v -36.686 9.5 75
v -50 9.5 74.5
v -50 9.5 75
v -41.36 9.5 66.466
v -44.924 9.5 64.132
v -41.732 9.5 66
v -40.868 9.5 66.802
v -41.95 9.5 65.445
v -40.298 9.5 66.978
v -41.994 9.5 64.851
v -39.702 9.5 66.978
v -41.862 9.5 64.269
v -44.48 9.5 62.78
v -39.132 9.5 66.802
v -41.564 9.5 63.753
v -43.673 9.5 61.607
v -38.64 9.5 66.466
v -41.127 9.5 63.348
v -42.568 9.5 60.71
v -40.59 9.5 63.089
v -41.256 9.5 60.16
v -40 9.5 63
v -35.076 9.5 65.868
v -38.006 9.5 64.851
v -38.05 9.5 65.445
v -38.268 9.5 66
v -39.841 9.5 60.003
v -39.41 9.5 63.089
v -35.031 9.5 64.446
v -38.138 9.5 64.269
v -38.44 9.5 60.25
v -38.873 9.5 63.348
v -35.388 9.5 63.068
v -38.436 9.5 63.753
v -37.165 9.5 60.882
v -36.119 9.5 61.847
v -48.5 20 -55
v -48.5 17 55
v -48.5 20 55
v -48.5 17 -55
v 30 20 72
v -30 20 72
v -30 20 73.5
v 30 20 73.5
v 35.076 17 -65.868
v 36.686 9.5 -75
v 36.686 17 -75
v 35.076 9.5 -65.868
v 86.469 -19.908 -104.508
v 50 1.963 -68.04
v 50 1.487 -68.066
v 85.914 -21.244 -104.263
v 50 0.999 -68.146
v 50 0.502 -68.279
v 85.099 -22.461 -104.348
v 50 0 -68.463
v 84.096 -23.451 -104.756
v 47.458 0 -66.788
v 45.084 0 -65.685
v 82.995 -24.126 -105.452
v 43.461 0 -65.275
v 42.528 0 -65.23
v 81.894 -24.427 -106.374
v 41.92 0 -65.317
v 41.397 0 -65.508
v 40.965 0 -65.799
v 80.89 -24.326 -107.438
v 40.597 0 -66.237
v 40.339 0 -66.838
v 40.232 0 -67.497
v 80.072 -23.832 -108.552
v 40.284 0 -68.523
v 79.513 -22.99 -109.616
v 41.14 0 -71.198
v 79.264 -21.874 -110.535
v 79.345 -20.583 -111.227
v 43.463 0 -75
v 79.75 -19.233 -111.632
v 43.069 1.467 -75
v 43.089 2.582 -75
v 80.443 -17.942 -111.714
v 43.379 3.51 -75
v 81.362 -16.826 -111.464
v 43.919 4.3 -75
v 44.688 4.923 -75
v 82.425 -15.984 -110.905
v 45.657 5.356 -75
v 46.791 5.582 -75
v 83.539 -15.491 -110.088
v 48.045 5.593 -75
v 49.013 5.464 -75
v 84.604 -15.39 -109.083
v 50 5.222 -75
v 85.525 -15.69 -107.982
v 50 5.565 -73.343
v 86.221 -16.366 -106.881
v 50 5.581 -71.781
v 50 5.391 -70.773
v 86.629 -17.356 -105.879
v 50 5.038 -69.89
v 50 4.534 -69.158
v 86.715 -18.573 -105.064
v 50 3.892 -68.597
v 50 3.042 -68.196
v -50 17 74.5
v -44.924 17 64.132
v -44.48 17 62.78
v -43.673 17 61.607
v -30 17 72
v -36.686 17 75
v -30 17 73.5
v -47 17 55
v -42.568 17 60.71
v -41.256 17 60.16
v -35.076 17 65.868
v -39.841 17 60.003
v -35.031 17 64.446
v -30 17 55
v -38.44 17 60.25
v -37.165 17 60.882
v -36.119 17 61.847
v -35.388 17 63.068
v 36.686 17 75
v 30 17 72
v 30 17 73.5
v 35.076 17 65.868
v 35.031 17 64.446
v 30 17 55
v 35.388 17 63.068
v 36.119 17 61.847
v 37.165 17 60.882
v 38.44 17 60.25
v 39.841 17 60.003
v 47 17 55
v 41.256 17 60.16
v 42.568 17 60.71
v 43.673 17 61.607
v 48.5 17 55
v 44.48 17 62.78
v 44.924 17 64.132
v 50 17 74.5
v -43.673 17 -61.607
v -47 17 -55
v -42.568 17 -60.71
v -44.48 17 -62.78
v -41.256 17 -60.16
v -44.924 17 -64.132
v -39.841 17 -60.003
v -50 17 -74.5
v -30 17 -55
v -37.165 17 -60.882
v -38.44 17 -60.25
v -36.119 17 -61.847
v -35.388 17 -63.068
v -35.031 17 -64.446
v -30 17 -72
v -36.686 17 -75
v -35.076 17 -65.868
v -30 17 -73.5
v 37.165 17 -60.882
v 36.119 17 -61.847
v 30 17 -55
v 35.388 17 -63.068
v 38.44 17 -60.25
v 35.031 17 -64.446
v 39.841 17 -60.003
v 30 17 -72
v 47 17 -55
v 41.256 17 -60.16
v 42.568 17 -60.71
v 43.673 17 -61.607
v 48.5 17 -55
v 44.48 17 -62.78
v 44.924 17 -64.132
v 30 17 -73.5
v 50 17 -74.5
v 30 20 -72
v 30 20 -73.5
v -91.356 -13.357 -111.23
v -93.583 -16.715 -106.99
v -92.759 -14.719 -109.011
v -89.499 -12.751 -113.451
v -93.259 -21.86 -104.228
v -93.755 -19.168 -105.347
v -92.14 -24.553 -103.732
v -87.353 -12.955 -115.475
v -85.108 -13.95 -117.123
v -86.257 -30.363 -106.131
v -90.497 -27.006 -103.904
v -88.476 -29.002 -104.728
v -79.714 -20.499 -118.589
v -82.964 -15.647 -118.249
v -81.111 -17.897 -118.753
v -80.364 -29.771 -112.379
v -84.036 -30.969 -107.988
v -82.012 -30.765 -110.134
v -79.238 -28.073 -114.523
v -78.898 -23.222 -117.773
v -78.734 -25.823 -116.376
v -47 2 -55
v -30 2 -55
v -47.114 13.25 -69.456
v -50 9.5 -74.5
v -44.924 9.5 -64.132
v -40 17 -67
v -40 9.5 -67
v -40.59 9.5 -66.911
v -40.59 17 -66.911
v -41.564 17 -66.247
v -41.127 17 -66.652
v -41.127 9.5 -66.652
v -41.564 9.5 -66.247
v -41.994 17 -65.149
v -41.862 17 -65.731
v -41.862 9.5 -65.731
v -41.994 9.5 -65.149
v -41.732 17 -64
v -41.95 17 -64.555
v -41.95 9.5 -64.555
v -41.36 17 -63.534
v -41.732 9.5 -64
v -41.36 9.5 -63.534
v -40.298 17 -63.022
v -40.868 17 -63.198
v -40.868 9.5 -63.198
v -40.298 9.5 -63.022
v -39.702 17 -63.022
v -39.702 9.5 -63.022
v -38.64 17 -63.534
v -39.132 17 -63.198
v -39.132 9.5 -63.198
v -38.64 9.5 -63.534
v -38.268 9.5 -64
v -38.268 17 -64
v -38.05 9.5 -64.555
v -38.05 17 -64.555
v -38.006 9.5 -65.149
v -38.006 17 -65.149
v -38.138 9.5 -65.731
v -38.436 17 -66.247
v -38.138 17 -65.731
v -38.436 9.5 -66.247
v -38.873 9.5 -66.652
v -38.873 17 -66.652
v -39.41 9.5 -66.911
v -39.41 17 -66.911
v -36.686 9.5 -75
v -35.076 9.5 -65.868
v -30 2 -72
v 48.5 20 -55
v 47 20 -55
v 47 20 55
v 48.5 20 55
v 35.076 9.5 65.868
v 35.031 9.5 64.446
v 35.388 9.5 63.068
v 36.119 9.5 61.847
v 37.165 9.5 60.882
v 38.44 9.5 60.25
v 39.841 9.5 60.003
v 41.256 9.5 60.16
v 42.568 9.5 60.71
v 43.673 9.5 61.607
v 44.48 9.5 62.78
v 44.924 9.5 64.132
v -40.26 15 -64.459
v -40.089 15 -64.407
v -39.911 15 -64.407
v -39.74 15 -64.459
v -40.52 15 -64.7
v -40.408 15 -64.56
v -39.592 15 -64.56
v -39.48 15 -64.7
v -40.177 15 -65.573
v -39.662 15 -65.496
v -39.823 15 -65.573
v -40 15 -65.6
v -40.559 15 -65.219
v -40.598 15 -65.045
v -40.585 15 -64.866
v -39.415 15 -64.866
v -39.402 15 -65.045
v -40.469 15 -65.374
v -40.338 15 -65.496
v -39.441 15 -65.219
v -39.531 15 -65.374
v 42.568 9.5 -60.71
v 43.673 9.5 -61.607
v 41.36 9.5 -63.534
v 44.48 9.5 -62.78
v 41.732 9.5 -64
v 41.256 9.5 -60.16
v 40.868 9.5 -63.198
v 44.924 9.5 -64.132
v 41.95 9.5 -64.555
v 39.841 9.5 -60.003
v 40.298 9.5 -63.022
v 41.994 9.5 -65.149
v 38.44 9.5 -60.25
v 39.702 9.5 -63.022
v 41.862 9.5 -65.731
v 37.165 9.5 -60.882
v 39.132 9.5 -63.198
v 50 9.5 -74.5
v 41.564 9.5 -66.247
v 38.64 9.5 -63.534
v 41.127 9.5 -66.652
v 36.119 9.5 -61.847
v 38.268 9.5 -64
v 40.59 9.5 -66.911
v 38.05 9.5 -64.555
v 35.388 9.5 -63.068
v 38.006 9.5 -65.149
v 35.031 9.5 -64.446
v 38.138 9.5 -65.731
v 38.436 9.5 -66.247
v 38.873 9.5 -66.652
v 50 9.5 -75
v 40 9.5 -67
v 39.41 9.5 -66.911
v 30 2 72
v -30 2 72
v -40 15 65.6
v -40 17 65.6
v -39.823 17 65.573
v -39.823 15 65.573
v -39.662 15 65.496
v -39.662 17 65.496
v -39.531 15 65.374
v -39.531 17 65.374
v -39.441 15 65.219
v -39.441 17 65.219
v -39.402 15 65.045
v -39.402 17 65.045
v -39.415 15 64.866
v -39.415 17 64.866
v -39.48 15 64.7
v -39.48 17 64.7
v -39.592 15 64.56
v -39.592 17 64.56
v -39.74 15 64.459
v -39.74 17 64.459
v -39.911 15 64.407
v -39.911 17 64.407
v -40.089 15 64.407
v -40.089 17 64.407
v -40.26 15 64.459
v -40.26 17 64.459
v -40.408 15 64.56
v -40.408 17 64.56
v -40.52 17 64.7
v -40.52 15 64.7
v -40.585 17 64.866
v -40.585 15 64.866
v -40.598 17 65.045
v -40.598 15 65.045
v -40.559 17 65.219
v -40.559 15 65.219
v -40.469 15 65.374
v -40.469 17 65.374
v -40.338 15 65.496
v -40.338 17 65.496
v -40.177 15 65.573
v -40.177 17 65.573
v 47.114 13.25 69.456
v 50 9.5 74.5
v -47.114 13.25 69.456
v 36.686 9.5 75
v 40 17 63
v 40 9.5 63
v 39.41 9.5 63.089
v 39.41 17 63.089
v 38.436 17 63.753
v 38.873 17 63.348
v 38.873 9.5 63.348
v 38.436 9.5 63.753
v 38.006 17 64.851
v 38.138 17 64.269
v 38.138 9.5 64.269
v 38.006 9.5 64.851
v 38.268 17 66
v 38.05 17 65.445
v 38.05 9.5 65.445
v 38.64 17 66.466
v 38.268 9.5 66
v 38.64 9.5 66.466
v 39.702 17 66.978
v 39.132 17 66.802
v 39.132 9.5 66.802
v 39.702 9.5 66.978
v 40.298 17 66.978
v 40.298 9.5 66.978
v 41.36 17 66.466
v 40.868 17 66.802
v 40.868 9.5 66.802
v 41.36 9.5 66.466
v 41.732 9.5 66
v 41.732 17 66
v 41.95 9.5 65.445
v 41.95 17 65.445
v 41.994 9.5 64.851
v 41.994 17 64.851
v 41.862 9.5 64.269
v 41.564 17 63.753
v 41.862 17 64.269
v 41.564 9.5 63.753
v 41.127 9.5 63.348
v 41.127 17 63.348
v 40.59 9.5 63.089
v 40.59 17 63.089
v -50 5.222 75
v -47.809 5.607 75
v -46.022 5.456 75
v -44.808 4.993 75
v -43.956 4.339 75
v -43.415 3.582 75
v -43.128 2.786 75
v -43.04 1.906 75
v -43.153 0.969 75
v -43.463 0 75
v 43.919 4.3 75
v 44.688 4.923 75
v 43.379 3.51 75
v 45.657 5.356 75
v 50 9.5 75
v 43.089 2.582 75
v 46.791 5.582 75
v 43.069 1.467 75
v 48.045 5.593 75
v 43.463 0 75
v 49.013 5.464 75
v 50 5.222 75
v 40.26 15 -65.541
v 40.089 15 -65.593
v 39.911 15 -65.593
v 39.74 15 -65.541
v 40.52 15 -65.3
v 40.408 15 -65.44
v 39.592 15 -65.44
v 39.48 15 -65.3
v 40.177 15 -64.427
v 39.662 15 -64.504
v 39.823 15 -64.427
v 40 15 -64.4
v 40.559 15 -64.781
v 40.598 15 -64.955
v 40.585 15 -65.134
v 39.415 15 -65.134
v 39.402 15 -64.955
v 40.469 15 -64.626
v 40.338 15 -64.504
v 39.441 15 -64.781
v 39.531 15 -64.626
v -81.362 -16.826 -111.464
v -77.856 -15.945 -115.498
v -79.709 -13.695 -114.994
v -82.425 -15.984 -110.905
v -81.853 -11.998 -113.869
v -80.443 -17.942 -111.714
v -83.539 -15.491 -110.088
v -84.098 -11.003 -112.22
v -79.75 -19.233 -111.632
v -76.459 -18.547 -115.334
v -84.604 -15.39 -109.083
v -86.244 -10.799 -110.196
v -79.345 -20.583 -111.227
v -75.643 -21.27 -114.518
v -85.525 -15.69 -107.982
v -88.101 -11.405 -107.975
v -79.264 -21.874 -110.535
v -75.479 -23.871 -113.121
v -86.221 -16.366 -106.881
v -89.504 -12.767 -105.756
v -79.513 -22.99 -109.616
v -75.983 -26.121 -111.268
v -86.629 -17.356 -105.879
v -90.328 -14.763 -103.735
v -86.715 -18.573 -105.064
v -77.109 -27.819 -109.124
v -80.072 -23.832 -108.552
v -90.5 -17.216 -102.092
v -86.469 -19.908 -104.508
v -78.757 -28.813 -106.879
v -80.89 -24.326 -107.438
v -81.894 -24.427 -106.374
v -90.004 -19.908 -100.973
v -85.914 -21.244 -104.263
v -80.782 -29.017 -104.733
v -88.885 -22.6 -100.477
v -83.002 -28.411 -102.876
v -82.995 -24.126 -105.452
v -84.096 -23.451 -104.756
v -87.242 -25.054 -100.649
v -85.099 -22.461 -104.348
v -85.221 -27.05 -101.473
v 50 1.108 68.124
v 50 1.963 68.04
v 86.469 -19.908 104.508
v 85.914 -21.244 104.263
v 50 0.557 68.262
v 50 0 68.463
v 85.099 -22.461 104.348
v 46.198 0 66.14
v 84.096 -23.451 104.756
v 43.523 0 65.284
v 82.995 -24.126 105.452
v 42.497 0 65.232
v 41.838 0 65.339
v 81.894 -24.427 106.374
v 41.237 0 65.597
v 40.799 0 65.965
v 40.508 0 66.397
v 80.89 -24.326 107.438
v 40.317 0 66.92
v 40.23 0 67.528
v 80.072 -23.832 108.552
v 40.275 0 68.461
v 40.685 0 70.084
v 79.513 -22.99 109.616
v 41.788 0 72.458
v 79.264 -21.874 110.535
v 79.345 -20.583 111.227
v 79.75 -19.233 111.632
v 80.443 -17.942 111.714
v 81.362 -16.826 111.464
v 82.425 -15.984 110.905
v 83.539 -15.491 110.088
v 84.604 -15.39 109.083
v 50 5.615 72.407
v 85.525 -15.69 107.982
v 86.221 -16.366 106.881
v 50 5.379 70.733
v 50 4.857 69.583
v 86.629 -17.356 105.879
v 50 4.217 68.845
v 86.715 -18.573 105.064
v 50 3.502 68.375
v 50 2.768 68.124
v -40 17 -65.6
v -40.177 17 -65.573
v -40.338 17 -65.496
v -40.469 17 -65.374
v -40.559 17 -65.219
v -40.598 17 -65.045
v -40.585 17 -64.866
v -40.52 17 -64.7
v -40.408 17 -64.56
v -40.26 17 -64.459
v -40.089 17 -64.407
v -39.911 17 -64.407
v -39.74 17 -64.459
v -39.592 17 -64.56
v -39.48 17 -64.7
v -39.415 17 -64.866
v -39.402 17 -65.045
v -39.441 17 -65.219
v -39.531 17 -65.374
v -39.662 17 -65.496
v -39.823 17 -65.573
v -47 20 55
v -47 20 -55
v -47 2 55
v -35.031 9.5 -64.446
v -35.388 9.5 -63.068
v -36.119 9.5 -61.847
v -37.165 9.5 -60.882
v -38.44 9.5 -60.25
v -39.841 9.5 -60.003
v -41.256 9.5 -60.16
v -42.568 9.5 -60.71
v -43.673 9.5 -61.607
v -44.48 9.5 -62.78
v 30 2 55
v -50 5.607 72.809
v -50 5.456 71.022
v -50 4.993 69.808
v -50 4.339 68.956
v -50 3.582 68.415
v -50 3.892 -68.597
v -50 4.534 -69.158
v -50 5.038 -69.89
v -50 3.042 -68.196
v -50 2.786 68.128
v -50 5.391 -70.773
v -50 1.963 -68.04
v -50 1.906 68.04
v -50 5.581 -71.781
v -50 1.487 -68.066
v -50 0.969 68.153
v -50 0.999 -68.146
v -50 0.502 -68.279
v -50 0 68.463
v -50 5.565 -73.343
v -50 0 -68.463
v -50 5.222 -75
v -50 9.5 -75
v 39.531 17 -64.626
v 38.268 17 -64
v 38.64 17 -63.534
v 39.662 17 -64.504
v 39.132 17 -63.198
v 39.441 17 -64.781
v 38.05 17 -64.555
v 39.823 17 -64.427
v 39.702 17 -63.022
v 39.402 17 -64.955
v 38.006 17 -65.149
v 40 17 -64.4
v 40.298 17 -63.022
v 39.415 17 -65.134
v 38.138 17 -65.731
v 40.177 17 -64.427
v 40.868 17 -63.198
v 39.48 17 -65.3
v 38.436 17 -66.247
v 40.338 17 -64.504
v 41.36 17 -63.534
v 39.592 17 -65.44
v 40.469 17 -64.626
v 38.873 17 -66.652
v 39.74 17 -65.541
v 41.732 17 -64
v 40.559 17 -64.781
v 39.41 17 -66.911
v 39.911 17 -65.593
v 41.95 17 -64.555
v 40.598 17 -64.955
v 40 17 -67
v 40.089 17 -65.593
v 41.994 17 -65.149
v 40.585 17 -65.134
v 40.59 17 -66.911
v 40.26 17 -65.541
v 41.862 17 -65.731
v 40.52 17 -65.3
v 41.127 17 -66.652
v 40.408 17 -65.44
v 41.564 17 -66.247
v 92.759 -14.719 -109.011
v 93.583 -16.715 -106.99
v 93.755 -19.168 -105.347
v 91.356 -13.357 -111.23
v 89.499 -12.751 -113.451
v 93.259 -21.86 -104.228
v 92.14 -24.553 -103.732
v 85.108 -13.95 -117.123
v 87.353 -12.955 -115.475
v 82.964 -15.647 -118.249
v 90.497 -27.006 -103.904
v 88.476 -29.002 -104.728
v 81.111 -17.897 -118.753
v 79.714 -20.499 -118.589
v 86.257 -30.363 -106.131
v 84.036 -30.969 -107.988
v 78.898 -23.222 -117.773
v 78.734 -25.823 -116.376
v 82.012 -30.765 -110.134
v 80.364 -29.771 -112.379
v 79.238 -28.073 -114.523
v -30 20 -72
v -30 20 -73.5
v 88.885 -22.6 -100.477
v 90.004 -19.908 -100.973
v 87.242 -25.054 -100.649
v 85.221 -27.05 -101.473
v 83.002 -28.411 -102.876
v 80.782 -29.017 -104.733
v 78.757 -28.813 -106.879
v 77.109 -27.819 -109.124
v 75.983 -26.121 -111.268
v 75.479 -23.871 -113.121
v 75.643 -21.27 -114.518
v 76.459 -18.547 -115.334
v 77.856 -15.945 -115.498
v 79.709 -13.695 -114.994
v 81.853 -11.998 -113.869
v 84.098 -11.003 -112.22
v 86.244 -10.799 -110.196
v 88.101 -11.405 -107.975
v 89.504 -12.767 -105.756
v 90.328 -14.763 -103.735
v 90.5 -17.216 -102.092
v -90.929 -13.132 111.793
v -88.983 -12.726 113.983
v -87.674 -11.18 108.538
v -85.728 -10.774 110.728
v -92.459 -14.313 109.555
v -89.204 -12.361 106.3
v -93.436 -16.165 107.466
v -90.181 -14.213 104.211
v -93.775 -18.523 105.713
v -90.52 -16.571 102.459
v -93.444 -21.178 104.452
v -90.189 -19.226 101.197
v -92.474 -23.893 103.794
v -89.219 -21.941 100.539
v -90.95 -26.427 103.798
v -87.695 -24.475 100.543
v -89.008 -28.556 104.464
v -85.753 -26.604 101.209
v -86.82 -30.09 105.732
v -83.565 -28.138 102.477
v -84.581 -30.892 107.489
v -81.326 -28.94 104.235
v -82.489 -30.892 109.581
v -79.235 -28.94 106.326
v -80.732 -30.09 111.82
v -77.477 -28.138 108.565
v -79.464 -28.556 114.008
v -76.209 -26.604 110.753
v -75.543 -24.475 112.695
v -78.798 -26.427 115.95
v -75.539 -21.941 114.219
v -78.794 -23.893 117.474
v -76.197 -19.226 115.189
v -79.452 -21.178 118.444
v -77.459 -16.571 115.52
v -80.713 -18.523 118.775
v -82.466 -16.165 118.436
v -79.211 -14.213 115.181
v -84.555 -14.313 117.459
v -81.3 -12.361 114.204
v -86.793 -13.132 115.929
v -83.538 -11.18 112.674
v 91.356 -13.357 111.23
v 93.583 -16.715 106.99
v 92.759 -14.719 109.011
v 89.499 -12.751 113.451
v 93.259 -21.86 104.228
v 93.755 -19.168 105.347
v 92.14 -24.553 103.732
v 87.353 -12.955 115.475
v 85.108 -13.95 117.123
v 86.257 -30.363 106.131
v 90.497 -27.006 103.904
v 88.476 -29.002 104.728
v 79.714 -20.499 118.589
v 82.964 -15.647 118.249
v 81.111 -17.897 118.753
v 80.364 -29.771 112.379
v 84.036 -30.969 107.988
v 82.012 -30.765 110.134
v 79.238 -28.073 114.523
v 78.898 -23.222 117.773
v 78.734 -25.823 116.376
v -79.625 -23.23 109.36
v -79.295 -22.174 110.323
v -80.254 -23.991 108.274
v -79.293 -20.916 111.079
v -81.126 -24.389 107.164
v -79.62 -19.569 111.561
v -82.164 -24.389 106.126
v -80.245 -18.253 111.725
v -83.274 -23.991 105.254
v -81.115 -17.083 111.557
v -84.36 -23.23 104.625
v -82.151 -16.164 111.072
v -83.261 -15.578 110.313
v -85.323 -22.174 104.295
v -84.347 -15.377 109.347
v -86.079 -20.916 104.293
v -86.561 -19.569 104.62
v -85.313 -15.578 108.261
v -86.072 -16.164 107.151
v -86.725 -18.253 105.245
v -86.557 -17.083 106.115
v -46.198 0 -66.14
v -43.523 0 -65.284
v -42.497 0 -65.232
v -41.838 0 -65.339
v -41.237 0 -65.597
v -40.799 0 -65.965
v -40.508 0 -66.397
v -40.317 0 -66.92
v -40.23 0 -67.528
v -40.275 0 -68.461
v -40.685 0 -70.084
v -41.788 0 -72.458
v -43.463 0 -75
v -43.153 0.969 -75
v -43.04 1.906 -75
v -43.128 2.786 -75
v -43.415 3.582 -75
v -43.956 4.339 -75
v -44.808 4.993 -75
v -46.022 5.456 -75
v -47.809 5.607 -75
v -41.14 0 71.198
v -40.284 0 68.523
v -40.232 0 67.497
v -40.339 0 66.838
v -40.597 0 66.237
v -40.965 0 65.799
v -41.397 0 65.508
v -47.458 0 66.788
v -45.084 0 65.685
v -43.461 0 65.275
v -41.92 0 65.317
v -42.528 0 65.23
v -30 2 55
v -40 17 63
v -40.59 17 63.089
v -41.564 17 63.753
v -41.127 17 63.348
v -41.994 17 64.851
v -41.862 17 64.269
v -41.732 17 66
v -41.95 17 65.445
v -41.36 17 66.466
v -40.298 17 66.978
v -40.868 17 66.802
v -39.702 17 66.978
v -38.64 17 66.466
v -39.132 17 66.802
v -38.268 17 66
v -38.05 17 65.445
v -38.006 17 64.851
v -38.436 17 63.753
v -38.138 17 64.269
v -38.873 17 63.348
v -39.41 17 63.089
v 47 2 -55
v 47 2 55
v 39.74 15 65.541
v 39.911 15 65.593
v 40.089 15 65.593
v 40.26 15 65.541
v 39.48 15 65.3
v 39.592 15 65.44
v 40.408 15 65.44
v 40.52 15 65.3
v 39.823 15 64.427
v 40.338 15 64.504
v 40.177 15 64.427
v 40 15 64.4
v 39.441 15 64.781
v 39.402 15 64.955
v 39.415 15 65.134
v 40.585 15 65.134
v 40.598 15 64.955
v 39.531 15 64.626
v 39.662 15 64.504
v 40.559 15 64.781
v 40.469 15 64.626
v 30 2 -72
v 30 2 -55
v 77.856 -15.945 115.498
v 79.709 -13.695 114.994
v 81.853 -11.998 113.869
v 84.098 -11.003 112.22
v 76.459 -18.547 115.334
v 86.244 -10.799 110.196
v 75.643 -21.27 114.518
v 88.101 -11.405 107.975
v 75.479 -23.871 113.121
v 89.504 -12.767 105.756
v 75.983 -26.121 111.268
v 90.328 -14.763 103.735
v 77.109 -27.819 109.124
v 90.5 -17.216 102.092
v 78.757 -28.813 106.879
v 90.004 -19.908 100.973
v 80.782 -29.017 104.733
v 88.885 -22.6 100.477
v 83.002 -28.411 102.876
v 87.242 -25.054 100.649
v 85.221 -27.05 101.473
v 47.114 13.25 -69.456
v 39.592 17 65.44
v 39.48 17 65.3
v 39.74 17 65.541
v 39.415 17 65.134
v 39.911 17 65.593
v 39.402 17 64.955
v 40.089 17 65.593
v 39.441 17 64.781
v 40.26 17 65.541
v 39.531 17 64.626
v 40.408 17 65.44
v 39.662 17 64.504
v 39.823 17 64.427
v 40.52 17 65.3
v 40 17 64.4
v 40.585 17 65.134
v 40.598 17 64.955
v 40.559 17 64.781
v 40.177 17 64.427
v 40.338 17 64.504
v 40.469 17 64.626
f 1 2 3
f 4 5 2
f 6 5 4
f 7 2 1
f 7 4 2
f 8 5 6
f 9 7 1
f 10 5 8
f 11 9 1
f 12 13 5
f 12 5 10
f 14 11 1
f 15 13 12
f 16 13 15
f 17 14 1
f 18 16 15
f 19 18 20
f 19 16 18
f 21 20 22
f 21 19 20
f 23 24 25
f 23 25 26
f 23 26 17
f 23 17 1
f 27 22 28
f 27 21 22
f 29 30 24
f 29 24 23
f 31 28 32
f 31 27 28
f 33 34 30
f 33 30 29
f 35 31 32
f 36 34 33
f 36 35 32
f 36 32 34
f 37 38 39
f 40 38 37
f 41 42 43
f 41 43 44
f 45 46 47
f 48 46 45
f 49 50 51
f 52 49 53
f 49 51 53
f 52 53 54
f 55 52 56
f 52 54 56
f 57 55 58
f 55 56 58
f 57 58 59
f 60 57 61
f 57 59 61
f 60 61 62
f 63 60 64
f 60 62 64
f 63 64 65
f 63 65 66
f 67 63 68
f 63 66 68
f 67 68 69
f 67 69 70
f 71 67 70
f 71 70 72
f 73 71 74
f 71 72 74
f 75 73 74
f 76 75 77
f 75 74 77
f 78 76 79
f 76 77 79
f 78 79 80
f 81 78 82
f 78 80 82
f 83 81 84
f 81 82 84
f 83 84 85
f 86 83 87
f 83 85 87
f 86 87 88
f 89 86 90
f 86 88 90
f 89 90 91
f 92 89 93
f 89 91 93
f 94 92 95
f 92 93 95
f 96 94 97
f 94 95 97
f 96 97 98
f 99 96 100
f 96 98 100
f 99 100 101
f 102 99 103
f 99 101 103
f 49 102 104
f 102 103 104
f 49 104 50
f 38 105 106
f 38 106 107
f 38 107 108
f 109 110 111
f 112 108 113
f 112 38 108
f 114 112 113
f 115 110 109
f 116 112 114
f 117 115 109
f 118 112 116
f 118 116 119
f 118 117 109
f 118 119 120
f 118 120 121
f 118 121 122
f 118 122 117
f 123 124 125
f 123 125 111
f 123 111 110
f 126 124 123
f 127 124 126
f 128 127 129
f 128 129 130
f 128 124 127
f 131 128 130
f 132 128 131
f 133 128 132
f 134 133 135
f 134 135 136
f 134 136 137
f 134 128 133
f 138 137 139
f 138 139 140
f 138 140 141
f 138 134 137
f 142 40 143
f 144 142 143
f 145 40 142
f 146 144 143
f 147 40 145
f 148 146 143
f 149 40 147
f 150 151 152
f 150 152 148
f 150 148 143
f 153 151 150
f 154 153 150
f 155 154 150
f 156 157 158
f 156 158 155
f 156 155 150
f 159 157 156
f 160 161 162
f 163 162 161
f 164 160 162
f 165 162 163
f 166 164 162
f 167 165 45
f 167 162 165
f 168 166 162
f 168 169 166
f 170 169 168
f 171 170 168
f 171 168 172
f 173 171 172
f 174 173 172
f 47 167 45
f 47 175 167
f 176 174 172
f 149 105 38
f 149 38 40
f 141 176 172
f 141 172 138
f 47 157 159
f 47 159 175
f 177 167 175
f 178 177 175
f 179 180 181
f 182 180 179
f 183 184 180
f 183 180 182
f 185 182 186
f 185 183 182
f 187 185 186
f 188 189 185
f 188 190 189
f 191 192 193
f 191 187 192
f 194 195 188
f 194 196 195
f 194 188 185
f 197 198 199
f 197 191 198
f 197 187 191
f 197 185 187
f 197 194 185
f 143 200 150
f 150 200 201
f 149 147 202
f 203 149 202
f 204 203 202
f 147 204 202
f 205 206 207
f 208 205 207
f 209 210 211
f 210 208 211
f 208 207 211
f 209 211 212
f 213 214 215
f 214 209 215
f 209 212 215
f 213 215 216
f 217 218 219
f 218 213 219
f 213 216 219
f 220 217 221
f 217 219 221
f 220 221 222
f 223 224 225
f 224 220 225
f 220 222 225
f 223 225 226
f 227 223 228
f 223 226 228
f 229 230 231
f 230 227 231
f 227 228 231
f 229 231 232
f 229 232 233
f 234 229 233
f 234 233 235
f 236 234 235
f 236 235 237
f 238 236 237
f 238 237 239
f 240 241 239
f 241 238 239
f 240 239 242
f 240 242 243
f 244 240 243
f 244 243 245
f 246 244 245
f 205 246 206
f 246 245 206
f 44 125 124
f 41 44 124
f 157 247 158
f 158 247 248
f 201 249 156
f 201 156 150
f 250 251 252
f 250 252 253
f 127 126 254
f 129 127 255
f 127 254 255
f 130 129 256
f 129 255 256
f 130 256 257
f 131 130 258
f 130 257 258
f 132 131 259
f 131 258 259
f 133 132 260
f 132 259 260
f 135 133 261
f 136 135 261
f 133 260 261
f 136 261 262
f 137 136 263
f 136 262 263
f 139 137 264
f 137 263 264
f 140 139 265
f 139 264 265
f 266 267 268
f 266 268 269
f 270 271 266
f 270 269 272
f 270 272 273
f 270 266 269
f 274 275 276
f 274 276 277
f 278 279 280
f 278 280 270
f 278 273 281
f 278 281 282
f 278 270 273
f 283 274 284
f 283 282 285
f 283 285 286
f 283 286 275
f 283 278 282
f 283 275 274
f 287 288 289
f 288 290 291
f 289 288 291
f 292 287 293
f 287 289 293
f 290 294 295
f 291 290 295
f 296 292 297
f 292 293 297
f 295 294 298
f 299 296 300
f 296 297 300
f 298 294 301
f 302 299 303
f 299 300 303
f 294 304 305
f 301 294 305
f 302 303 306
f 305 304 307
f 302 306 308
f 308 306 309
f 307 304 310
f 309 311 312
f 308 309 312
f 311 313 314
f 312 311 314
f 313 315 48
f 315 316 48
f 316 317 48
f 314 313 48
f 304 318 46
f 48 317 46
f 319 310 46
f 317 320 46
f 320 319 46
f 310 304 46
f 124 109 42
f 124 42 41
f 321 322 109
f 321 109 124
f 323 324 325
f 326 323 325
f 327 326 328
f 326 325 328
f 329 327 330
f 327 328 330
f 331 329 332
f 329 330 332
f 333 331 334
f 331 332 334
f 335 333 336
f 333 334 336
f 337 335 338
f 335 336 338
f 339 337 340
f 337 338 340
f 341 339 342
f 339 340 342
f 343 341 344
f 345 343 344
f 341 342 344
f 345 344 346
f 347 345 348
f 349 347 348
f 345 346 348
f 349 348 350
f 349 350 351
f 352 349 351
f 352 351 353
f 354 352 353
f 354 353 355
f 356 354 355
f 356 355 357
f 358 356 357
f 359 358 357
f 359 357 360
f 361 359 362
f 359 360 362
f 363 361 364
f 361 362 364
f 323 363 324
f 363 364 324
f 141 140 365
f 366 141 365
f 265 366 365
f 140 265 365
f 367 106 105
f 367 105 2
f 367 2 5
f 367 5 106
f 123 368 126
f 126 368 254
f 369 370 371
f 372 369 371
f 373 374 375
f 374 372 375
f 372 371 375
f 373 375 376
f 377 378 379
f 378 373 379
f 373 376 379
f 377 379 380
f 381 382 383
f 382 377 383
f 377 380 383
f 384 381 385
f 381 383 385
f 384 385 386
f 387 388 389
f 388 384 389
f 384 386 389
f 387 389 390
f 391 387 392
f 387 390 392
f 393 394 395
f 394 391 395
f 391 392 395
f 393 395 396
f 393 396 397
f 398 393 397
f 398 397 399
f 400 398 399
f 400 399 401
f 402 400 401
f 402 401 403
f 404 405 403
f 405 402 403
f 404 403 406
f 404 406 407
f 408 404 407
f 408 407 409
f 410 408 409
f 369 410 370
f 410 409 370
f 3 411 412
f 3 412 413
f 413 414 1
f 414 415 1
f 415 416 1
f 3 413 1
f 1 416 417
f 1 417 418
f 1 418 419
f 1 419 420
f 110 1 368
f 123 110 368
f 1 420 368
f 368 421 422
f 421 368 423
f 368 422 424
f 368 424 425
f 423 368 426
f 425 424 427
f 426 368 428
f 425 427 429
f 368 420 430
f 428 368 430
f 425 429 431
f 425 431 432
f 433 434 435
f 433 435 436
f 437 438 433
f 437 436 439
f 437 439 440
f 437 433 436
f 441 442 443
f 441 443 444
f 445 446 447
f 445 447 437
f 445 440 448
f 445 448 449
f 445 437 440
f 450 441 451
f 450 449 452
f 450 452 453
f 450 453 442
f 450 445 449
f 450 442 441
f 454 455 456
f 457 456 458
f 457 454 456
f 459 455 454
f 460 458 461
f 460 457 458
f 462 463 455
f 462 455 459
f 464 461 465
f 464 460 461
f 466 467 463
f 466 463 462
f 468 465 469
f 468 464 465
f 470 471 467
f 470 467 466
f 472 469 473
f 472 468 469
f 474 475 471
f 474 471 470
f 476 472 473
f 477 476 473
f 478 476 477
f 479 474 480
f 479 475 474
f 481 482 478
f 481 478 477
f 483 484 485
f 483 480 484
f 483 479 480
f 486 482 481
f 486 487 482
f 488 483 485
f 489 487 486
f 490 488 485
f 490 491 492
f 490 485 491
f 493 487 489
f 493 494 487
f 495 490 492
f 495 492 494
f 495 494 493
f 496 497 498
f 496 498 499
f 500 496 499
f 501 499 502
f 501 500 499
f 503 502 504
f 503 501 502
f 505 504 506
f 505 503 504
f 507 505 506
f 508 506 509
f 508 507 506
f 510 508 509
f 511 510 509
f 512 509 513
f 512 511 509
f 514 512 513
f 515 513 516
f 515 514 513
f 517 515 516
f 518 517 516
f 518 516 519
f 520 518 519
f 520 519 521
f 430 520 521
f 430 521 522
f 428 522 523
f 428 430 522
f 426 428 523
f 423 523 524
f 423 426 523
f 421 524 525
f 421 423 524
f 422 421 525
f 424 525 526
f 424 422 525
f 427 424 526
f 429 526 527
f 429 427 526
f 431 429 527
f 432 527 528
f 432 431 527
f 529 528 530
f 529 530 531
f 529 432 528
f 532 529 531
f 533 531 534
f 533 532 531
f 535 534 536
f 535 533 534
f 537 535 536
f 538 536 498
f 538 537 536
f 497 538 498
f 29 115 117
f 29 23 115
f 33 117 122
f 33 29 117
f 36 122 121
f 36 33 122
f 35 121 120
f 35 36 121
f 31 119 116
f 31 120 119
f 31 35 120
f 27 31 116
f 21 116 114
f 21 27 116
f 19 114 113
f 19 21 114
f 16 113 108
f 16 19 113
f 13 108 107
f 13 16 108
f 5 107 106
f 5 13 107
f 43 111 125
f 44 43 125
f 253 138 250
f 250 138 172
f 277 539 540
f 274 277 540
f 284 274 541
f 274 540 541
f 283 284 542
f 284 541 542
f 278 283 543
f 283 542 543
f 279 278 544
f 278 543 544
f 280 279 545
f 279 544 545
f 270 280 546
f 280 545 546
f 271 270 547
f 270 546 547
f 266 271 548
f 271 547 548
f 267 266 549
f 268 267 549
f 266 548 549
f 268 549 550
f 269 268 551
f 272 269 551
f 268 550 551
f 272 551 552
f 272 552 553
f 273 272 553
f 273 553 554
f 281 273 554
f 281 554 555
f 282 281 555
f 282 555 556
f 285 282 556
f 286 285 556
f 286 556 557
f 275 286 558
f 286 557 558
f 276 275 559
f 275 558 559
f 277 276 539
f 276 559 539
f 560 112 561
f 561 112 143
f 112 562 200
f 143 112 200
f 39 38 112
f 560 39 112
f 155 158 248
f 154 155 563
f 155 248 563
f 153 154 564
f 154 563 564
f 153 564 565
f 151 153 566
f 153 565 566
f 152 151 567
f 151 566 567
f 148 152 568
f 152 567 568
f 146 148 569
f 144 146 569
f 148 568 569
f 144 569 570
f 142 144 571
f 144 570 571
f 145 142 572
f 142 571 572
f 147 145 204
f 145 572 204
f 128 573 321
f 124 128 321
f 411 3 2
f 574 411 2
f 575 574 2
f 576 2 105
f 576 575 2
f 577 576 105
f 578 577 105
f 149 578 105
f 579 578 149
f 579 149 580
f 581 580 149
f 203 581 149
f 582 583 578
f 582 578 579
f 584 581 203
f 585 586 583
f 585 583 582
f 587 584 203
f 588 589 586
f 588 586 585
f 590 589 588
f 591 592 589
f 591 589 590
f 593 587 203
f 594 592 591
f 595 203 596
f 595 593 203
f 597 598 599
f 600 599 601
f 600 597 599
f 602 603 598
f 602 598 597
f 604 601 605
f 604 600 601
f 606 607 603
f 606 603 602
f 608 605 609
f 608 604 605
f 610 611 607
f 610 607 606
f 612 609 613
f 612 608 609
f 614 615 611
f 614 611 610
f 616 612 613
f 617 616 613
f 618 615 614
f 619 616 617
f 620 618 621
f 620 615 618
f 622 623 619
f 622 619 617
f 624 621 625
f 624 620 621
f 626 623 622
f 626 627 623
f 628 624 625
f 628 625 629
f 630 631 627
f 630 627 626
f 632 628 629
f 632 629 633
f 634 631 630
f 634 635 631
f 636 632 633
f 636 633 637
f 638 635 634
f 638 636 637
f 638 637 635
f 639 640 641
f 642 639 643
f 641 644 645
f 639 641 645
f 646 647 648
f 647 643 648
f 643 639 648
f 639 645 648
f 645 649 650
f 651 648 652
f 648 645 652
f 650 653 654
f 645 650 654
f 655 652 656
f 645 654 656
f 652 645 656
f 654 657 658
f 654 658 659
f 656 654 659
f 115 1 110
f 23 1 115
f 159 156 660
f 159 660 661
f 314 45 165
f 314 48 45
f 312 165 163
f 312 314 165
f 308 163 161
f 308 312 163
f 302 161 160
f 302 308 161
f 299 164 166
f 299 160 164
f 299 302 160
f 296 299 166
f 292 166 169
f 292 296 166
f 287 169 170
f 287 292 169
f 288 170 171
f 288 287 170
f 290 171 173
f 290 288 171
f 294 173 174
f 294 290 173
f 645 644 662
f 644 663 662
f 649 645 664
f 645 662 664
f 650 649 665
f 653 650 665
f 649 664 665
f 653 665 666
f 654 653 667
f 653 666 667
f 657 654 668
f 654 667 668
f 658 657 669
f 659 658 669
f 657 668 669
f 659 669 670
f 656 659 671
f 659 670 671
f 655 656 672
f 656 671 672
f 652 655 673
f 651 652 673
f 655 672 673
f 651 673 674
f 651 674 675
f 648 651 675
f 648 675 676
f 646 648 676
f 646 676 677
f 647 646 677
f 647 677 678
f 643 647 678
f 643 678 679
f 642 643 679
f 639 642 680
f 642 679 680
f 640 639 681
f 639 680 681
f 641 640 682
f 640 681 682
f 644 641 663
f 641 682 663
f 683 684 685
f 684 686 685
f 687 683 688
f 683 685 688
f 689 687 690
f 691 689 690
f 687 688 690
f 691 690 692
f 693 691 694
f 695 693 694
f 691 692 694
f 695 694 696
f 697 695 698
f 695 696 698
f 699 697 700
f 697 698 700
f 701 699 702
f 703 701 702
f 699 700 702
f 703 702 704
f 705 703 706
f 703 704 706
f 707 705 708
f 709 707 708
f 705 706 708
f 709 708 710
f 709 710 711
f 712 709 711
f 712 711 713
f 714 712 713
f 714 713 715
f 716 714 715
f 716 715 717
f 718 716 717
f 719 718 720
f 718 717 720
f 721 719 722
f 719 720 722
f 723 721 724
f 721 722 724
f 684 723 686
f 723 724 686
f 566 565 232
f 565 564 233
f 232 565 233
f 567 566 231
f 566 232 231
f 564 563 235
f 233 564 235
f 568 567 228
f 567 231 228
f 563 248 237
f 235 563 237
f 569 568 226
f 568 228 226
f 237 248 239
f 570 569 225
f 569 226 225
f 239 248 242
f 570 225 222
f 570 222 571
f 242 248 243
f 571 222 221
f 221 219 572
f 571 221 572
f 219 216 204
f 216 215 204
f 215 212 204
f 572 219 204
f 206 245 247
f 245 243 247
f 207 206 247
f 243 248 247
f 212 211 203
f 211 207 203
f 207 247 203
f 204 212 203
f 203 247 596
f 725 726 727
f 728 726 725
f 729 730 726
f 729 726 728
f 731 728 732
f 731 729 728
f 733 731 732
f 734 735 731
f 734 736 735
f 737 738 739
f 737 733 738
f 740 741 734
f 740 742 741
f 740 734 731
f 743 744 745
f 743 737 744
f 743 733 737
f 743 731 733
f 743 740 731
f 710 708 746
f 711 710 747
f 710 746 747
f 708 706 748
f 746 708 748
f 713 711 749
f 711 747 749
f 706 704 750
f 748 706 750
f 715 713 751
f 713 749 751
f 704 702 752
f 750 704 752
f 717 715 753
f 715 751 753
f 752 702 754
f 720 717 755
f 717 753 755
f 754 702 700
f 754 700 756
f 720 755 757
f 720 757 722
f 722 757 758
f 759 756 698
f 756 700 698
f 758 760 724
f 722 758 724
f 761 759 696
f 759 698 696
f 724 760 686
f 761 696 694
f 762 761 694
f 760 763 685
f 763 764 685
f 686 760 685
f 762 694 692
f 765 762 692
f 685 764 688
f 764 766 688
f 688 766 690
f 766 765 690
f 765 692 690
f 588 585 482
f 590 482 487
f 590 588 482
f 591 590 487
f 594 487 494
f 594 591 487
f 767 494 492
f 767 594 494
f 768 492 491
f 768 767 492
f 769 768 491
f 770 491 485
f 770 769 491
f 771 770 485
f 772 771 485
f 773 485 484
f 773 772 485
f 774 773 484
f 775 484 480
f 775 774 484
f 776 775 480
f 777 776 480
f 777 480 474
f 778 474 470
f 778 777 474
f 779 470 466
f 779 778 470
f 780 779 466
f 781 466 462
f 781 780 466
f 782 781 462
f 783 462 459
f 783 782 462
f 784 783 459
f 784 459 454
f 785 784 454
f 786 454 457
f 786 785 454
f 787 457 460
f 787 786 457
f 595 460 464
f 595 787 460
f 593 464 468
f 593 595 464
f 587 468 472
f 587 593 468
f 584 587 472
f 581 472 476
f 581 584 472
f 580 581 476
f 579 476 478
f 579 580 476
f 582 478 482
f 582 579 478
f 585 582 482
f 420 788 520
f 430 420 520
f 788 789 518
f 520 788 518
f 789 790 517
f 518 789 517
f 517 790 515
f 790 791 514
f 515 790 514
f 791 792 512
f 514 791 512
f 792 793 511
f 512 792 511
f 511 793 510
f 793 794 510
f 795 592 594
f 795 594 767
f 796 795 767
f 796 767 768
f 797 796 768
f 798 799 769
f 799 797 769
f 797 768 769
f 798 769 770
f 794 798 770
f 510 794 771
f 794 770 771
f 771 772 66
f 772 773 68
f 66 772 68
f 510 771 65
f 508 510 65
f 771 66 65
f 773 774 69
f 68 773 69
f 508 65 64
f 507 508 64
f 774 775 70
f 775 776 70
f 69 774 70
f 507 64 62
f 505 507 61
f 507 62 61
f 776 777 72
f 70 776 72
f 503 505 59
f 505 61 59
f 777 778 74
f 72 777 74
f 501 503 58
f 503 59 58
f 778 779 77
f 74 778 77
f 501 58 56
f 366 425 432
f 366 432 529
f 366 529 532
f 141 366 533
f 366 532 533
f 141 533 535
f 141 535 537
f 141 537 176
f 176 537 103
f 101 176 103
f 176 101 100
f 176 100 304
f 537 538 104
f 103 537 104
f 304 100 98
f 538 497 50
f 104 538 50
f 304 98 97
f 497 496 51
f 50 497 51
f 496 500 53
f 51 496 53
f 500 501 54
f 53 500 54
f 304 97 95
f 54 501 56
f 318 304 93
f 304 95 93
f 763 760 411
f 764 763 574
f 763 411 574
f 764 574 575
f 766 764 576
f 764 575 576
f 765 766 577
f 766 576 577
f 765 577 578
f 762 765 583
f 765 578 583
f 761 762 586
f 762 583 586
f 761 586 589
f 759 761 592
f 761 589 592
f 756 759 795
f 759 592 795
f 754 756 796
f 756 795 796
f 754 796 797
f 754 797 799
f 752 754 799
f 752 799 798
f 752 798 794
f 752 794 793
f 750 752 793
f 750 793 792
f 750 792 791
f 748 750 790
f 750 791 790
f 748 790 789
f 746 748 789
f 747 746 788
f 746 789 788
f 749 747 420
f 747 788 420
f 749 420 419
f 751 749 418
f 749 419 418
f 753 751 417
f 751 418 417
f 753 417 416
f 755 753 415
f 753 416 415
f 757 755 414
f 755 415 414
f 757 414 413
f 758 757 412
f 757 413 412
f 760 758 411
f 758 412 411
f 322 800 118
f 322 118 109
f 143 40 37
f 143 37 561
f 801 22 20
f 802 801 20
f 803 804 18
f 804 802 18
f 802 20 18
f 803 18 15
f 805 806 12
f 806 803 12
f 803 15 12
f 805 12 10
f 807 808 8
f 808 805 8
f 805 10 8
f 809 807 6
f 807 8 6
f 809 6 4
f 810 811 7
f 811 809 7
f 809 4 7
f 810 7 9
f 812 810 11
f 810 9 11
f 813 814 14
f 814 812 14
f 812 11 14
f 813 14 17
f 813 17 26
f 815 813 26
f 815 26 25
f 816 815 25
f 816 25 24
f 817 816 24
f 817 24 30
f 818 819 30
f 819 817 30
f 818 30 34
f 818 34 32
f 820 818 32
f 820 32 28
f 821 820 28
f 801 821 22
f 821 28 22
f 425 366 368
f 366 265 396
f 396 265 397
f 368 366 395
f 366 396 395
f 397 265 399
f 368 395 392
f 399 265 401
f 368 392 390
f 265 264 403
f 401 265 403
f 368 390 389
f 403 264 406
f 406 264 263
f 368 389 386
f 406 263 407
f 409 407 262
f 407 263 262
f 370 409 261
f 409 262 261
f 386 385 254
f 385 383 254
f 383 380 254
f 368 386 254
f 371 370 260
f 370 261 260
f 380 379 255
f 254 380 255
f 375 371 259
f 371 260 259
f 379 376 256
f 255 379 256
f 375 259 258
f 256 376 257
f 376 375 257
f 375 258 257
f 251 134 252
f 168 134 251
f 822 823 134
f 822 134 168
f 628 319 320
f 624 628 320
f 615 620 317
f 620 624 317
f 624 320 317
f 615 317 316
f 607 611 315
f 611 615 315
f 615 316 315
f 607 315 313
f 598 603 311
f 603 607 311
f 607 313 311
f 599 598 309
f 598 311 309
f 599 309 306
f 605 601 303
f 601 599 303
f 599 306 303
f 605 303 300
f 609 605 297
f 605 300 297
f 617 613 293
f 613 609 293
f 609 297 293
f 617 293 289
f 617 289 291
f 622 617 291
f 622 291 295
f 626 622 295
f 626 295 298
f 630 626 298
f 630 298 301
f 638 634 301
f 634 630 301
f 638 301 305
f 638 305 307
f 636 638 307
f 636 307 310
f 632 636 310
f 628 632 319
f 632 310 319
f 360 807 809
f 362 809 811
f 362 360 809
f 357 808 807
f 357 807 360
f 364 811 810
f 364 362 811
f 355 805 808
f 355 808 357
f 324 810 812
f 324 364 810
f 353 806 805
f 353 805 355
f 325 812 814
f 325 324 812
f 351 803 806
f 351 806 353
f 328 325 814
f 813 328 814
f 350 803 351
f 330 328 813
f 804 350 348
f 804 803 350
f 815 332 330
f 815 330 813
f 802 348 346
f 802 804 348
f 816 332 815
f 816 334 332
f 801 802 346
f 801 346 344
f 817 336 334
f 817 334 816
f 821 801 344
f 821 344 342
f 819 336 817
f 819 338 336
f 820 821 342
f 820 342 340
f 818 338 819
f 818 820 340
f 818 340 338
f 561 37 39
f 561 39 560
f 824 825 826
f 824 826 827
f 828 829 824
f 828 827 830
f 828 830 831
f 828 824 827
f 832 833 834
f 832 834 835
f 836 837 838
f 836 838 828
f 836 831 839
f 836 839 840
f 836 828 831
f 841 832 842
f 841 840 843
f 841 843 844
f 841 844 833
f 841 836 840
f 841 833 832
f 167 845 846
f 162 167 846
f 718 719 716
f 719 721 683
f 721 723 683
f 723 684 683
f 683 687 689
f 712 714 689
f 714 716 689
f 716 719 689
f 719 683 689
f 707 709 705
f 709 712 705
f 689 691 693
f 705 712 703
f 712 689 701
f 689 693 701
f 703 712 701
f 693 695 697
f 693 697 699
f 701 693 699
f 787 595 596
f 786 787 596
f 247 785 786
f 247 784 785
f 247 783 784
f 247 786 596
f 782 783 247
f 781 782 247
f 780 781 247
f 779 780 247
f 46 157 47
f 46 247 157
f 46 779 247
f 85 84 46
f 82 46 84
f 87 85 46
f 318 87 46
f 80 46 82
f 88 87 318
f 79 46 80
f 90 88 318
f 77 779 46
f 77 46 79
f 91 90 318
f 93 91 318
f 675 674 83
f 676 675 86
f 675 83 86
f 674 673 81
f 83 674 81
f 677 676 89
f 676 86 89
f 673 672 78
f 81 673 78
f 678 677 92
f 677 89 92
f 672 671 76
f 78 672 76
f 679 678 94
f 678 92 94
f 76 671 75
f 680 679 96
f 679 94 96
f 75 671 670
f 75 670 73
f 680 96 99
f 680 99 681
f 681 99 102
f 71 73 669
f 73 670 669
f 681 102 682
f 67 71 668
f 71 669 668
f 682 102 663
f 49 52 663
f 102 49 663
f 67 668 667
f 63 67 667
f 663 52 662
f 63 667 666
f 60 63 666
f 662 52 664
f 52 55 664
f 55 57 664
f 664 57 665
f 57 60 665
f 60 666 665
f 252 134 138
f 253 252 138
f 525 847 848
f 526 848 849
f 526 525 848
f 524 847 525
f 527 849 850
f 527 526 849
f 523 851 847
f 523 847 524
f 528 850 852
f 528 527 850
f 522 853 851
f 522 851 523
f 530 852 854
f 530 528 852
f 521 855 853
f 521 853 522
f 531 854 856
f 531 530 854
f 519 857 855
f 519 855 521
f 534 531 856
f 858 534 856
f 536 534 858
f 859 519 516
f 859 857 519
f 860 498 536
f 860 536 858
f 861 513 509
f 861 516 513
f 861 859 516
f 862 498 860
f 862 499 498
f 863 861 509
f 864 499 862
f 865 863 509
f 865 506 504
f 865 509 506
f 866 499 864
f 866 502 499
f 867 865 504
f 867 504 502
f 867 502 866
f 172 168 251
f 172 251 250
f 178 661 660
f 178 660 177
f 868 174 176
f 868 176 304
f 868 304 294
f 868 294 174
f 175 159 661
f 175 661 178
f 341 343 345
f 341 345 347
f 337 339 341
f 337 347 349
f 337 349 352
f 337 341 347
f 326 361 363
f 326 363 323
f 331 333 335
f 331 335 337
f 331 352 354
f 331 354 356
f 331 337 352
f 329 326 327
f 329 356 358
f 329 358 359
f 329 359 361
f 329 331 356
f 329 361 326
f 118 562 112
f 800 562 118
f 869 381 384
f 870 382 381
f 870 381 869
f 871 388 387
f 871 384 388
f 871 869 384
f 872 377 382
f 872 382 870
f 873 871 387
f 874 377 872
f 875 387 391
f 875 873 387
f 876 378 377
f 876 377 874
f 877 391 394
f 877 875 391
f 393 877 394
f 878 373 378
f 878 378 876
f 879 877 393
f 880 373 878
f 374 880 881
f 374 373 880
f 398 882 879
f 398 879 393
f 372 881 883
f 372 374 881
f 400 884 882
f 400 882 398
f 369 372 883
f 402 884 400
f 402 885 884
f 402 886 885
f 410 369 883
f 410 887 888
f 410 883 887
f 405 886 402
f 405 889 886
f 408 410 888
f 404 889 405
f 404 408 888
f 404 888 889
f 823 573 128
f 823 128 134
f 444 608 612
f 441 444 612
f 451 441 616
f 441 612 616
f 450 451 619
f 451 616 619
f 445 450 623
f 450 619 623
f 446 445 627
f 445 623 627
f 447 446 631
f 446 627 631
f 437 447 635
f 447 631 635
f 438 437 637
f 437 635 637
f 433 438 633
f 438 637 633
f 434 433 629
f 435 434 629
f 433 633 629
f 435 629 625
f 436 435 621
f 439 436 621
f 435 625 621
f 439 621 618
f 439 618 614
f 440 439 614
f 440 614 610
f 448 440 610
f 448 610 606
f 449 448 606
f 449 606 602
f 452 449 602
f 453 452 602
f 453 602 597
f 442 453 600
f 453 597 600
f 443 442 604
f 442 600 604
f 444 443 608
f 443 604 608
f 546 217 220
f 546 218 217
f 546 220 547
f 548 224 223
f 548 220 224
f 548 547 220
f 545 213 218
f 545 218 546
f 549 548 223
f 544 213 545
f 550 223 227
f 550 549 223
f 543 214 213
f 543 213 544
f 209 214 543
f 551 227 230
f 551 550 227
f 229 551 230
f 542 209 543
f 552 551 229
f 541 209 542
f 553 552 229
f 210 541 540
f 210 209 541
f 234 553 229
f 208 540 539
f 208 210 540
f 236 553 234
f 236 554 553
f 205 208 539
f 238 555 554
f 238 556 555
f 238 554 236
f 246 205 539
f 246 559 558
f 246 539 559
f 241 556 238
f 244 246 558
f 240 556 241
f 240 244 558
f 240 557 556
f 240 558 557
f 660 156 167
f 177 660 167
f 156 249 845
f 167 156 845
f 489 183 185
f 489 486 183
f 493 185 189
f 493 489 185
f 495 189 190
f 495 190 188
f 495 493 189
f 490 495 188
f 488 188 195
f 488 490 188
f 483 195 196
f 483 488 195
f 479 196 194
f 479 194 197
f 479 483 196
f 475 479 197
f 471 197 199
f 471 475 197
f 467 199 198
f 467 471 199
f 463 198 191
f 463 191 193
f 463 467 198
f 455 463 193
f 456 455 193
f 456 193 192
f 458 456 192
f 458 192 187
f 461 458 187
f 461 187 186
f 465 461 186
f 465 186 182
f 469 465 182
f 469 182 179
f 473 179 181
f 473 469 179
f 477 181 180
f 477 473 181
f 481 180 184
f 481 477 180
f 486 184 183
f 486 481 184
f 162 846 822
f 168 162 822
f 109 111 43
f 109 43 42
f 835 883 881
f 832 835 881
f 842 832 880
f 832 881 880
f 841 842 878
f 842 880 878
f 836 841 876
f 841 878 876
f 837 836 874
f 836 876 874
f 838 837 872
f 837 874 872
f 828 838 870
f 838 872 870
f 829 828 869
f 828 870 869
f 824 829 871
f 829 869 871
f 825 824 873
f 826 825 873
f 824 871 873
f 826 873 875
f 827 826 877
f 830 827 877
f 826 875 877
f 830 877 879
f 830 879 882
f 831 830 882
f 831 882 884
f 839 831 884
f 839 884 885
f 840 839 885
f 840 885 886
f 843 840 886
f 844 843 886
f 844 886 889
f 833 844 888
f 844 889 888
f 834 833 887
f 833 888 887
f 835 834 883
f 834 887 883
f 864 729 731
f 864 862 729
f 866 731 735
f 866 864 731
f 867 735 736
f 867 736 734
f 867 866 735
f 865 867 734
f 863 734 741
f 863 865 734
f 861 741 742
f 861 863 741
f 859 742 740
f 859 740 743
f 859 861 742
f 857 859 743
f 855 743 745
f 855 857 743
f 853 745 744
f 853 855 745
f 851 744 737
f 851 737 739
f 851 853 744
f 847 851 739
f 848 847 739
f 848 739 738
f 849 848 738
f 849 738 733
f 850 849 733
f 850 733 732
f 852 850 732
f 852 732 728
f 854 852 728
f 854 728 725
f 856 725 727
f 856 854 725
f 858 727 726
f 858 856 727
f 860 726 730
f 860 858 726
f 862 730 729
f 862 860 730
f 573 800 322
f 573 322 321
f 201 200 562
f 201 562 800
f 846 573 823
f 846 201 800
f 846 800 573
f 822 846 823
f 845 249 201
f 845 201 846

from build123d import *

# Parameters (mm, degrees)
CROQUIS1_W              = 100
CROQUIS1_H              = 150
SALIENTE_EXTRUIR1_DEPTH = 2
CROQUIS5_W              = 100
CROQUIS5_H              = 150
CROQUIS5_W_2            = 94
CROQUIS5_H_2            = 144
SALIENTE_EXTRUIR3_DEPTH = 15
CROQUIS6_W              = 20
CROQUIS6_H              = 20
SALIENTE_EXTRUIR4_DEPTH = 17
CROQUIS4_R              = 2
CORTAR_EXTRUIR2_DEPTH   = 92.378334412
SALIENTE_EXTRUIR5_DEPTH = 7.5
CROQUIS8_W              = 127.938872722
CROQUIS8_H              = 211.588515632
CROQUIS8_W_2            = 100
CROQUIS8_H_2            = 150
CORTAR_EXTRUIR3_DEPTH   = 115.867495711
CORTAR_EXTRUIR4_DEPTH   = 7.5
CROQUIS10_W             = 60
CROQUIS10_H             = 1.5
CROQUIS10_W_2           = 1.5
CROQUIS10_H_2           = 110
SALIENTE_EXTRUIR6_DEPTH = 3
CROQUIS12_R             = 0.6
CORTAR_EXTRUIR5_DEPTH   = 2
CORTAR_EXTRUIR7_DEPTH   = 157.655827733


with BuildPart() as part:
    # Croquis1 → Saliente-Extruir1 (new body)
    with BuildSketch(Plane(origin=(0, 0, 0), x_dir=(1, 0, 0), z_dir=(0, 1, 0))):
        Rectangle(CROQUIS1_W, CROQUIS1_H)
    extrude(amount=SALIENTE_EXTRUIR1_DEPTH)

    # Croquis5 → Saliente-Extruir3 (add)
    with BuildSketch(Plane(origin=(0, 2, 0), x_dir=(1, 0, 0), z_dir=(0, 1, 0))):
        Rectangle(CROQUIS5_W, CROQUIS5_H)
        Rectangle(CROQUIS5_W_2, CROQUIS5_H_2, mode=Mode.SUBTRACT)
    extrude(amount=SALIENTE_EXTRUIR3_DEPTH)

    # Croquis6 → Saliente-Extruir4 (add)
    with BuildSketch(Plane.XZ):
        with Locations((-40, 65)):
            Rectangle(CROQUIS6_W, CROQUIS6_H)
        with Locations((-40, -65)):
            Rectangle(CROQUIS6_W, CROQUIS6_H)
        with Locations((40, -65)):
            Rectangle(CROQUIS6_W, CROQUIS6_H)
        with Locations((40, 65)):
            Rectangle(CROQUIS6_W, CROQUIS6_H)
    extrude(amount=-SALIENTE_EXTRUIR4_DEPTH)

    # Croquis4 → Cortar-Extruir2 (cut, through all)
    # profile 1 of 4: a face of its own
    with BuildSketch(Plane(origin=(0, 2, 0), x_dir=(1, 0, 0), z_dir=(0, 1, 0))):
        with BuildLine():
            Line((-44.924038765, 64.131759112), (-46.660520542, 73.979836642))
            ThreePointArc((-46.660520542, 73.979836642), (-42.604722665, 79.772116295), (-36.812443012, 75.716318418))
            Line((-36.812443012, 75.716318418), (-35.075961235, 65.868240888))
            ThreePointArc((-35.075961235, 65.868240888), (-39.131759112, 60.075961235), (-44.924038765, 64.131759112))
        make_face()
        with Locations(Location((-40, 65, 0), (0, 0, 90))):
            Circle(CROQUIS4_R, mode=Mode.SUBTRACT)
    # profile 2 of 4: a face of its own
    with BuildSketch(Plane(origin=(0, 2, 0), x_dir=(1, 0, 0), z_dir=(0, 1, 0))):
        with BuildLine():
            Line((44.924038765, -64.131759112), (46.660520542, -73.979836642))
            ThreePointArc((46.660520542, -73.979836642), (42.604722665, -79.772116295), (36.812443012, -75.716318418))
            Line((36.812443012, -75.716318418), (35.075961235, -65.868240888))
            ThreePointArc((35.075961235, -65.868240888), (39.131759112, -60.075961235), (44.924038765, -64.131759112))
        make_face()
        with Locations(Location((40, -65, 0), (0, 0, 90))):
            Circle(CROQUIS4_R, mode=Mode.SUBTRACT)
    # profile 3 of 4: a face of its own
    with BuildSketch(Plane(origin=(0, 2, 0), x_dir=(1, 0, 0), z_dir=(0, 1, 0))):
        with BuildLine():
            Line((44.924038765, 64.131759112), (46.660520542, 73.979836642))
            ThreePointArc((46.660520542, 73.979836642), (42.604722665, 79.772116295), (36.812443012, 75.716318418))
            Line((36.812443012, 75.716318418), (35.075961235, 65.868240888))
            ThreePointArc((35.075961235, 65.868240888), (39.131759112, 60.075961235), (44.924038765, 64.131759112))
        make_face()
        with Locations(Location((40, 65, 0), (0, 0, 90))):
            Circle(CROQUIS4_R, mode=Mode.SUBTRACT)
    # profile 4 of 4: a face of its own
    with BuildSketch(Plane(origin=(0, 2, 0), x_dir=(1, 0, 0), z_dir=(0, 1, 0))):
        with BuildLine():
            Line((-44.924038765, -64.131759112), (-46.660520542, -73.979836642))
            ThreePointArc((-46.660520542, -73.979836642), (-42.604722665, -79.772116295), (-36.812443012, -75.716318418))
            Line((-36.812443012, -75.716318418), (-35.075961235, -65.868240888))
            ThreePointArc((-35.075961235, -65.868240888), (-39.131759112, -60.075961235), (-44.924038765, -64.131759112))
        make_face()
        with Locations(Location((-40, -65, 0), (0, 0, 90))):
            Circle(CROQUIS4_R, mode=Mode.SUBTRACT)
    extrude(amount=CORTAR_EXTRUIR2_DEPTH, mode=Mode.SUBTRACT)

    # Croquis7 → Saliente-Extruir5 (add)
    with BuildSketch(Plane(origin=(0, 2, 0), x_dir=(1, 0, 0), z_dir=(0, 1, 0))):
        with BuildLine():
            Line((35.075961235, 65.868240888), (39.187090394, 89.183612944))
            ThreePointArc((39.187090394, 89.183612944), (44.979370047, 93.239410821), (49.035167924, 87.447131167))
            Line((49.035167924, 87.447131167), (44.924038765, 64.131759112))
            ThreePointArc((44.924038765, 64.131759112), (39.131759112, 60.075961235), (35.075961235, 65.868240888))
        make_face()
        with BuildLine():
            Line((-44.924038765, 64.131759112), (-50.51627176, 95.846888427))
            ThreePointArc((-50.51627176, 95.846888427), (-46.460473883, 101.63916808), (-40.66819423, 97.583370203))
            Line((-40.66819423, 97.583370203), (-35.075961235, 65.868240888))
            ThreePointArc((-35.075961235, 65.868240888), (-39.131759112, 60.075961235), (-44.924038765, 64.131759112))
        make_face()
        with BuildLine():
            Line((-35.075961235, -65.868240888), (-36.812443012, -75.716318418))
            ThreePointArc((-36.812443012, -75.716318418), (-42.604722665, -79.772116295), (-46.660520542, -73.979836642))
            Line((-46.660520542, -73.979836642), (-44.924038765, -64.131759112))
            ThreePointArc((-44.924038765, -64.131759112), (-39.131759112, -60.075961235), (-35.075961235, -65.868240888))
        make_face()
        with BuildLine():
            Line((44.924038765, -64.131759112), (47.53565731, -78.942983887))
            ThreePointArc((47.53565731, -78.942983887), (43.479859434, -84.73526354), (37.68757978, -80.679465664))
            Line((37.68757978, -80.679465664), (35.075961235, -65.868240888))
            ThreePointArc((35.075961235, -65.868240888), (39.131759112, -60.075961235), (44.924038765, -64.131759112))
        make_face()
    extrude(amount=SALIENTE_EXTRUIR5_DEPTH)

    # Croquis8 → Cortar-Extruir3 (cut, through all)
    with BuildSketch(Plane.XZ):
        Rectangle(CROQUIS8_W, CROQUIS8_H)
        Rectangle(CROQUIS8_W_2, CROQUIS8_H_2, mode=Mode.SUBTRACT)
    extrude(amount=-CORTAR_EXTRUIR3_DEPTH, mode=Mode.SUBTRACT)

    # Croquis9 → Cortar-Extruir4 (cut)
    with BuildSketch(Plane(origin=(0, 17, 0), x_dir=(1, 0, 0), z_dir=(0, 1, 0))):
        with BuildLine():
            Line((-50, -74.5), (-50, -75))
            Line((-50, -75), (-44.511576947, -75))
            Line((-44.511576947, -75), (-44.511576947, -62.844617563))
            add(Edge.make_bspline(
                [(-50, -74.5), (-46.388295921, -69.021503378), (-44.511576947, -62.844617563)],
                knots=[0, 0, 0, 1, 1, 1], degree=2))
        make_face()
        with BuildLine():
            Line((50, -75), (44.511576947, -75))
            Line((44.511576947, -75), (44.511576947, -62.844617563))
            add(Edge.make_bspline(
                [(50, -74.5), (46.388295921, -69.021503378), (44.511576947, -62.844617563)],
                knots=[0, 0, 0, 1, 1, 1], degree=2))
            Line((50, -74.5), (50, -75))
        make_face()
        with BuildLine():
            Line((-50, 75), (-44.511576947, 75))
            Line((-44.511576947, 75), (-44.511576947, 62.844617563))
            add(Edge.make_bspline(
                [(-50, 74.5), (-46.388295921, 69.021503378), (-44.511576947, 62.844617563)],
                knots=[0, 0, 0, 1, 1, 1], degree=2))
            Line((-50, 74.5), (-50, 75))
        make_face()
        with BuildLine():
            Line((50, 75), (44.511576947, 75))
            Line((44.511576947, 75), (44.511576947, 62.844617563))
            add(Edge.make_bspline(
                [(50, 74.5), (46.388295921, 69.021503378), (44.511576947, 62.844617563)],
                knots=[0, 0, 0, 1, 1, 1], degree=2))
            Line((50, 74.5), (50, 75))
        make_face()
    extrude(amount=-CORTAR_EXTRUIR4_DEPTH, mode=Mode.SUBTRACT)

    # Croquis10 → Saliente-Extruir6 (add)
    with BuildSketch(Plane(origin=(0, 17, 0), x_dir=(1, 0, 0), z_dir=(0, 1, 0))):
        with Locations((0, 72.75)):
            Rectangle(CROQUIS10_W, CROQUIS10_H)
        with Locations((0, -72.75)):
            Rectangle(CROQUIS10_W, CROQUIS10_H)
        with Locations((-47.75, 0)):
            Rectangle(CROQUIS10_W_2, CROQUIS10_H_2)
        with Locations((47.75, 0)):
            Rectangle(CROQUIS10_W_2, CROQUIS10_H_2)
    extrude(amount=SALIENTE_EXTRUIR6_DEPTH)

    # Croquis12 → Cortar-Extruir5 (cut)
    with BuildSketch(Plane(origin=(0, 17, 0), x_dir=(1, 0, 0), z_dir=(0, 1, 0))):
        with Locations(Location((-40, -65, 0), (0, 0, 270))):
            Circle(CROQUIS12_R)
        with Locations(Location((-40, 65, 0), (0, 0, 90))):
            Circle(CROQUIS12_R)
        with Locations(Location((40, 65, 0), (0, 0, 270))):
            Circle(CROQUIS12_R)
        with Locations(Location((40, -65, 0), (0, 0, 90))):
            Circle(CROQUIS12_R)
    extrude(amount=-CORTAR_EXTRUIR5_DEPTH, mode=Mode.SUBTRACT)

    # Croquis17 → Revolución4 (revolve)
    with BuildSketch(Plane(origin=(-12.5, 0, -12.5), x_dir=(-0.7071067811865475, 0, 0.7071067811865476), z_dir=(-0.7071067811865476, 0, -0.7071067811865475)), mode=Mode.PRIVATE) as revoluci_n4_sk:
        Polygon((-74.388347648, 5.812970012), (-139.644463954, -21.860187069), (-143.51805142, -12.725874225), (-138.914857092, -10.773797899), (-136.962780767, -15.376992227), (-77.121254504, 10), align=None)
    revoluci_n4 = revolve(revoluci_n4_sk.sketch.rotate(Axis((40.100505063, 5.812970012, -65.100505063), (0.6509899848797962, -0.3904152650350718, -0.6509899848797963)), 90), axis=Axis((40.100505063, 5.812970012, -65.100505063), (0.6509899848797962, -0.3904152650350718, -0.6509899848797963)))

    # Simetría4: Revolución4 across plane
    add(revoluci_n4.mirror(Plane.XY))

    # Simetría5: Revolución4 across plane
    add(revoluci_n4.mirror(Plane(origin=(0, 0, 0), x_dir=(0, 0, 1), z_dir=(1, 0, 0))))

    # Simetría5 copy 1 sketch → Simetría5 copy 1 (revolve)
    with BuildSketch(Plane(origin=(12.5, 0, 12.5), x_dir=(0.7071067811865475, 0, -0.7071067811865476), z_dir=(0.7071067811865476, 0, 0.7071067811865475))):
        Polygon((-74.388347648, 5.812970012), (-139.644463954, -21.860187069), (-143.51805142, -12.725874225), (-138.914857092, -10.773797899), (-136.962780767, -15.376992227), (-77.121254504, 10), align=None)
    revolve(axis=Axis((-40.100505063, 5.812970012, 65.100505063), (-0.6509899848797962, -0.3904152650350718, 0.6509899848797963)))

    # Croquis19 → Cortar-Extruir7 (cut, through all)
    with BuildSketch(Plane(origin=(0, 9.5, 0), x_dir=(1, 0, 0), z_dir=(0, 1, 0))):
        Polygon((-43.417017803, -64.899000462), (-39.692445235, -68.264184449), (-41.99457515, -70.812172899), (-45.719147718, -67.446988912), align=None)
        Polygon((39.692445235, -68.264184449), (41.99457515, -70.812172899), (45.719147718, -67.446988912), (43.417017803, -64.899000462), align=None)
        Polygon((43.417017803, 64.899000462), (39.692445235, 68.264184449), (41.99457515, 70.812172899), (45.719147718, 67.446988912), align=None)
        Polygon((-39.692445235, 68.264184449), (-41.99457515, 70.812172899), (-45.719147718, 67.446988912), (-43.417017803, 64.899000462), align=None)
    extrude(amount=CORTAR_EXTRUIR7_DEPTH, mode=Mode.SUBTRACT)


solid = part.part
